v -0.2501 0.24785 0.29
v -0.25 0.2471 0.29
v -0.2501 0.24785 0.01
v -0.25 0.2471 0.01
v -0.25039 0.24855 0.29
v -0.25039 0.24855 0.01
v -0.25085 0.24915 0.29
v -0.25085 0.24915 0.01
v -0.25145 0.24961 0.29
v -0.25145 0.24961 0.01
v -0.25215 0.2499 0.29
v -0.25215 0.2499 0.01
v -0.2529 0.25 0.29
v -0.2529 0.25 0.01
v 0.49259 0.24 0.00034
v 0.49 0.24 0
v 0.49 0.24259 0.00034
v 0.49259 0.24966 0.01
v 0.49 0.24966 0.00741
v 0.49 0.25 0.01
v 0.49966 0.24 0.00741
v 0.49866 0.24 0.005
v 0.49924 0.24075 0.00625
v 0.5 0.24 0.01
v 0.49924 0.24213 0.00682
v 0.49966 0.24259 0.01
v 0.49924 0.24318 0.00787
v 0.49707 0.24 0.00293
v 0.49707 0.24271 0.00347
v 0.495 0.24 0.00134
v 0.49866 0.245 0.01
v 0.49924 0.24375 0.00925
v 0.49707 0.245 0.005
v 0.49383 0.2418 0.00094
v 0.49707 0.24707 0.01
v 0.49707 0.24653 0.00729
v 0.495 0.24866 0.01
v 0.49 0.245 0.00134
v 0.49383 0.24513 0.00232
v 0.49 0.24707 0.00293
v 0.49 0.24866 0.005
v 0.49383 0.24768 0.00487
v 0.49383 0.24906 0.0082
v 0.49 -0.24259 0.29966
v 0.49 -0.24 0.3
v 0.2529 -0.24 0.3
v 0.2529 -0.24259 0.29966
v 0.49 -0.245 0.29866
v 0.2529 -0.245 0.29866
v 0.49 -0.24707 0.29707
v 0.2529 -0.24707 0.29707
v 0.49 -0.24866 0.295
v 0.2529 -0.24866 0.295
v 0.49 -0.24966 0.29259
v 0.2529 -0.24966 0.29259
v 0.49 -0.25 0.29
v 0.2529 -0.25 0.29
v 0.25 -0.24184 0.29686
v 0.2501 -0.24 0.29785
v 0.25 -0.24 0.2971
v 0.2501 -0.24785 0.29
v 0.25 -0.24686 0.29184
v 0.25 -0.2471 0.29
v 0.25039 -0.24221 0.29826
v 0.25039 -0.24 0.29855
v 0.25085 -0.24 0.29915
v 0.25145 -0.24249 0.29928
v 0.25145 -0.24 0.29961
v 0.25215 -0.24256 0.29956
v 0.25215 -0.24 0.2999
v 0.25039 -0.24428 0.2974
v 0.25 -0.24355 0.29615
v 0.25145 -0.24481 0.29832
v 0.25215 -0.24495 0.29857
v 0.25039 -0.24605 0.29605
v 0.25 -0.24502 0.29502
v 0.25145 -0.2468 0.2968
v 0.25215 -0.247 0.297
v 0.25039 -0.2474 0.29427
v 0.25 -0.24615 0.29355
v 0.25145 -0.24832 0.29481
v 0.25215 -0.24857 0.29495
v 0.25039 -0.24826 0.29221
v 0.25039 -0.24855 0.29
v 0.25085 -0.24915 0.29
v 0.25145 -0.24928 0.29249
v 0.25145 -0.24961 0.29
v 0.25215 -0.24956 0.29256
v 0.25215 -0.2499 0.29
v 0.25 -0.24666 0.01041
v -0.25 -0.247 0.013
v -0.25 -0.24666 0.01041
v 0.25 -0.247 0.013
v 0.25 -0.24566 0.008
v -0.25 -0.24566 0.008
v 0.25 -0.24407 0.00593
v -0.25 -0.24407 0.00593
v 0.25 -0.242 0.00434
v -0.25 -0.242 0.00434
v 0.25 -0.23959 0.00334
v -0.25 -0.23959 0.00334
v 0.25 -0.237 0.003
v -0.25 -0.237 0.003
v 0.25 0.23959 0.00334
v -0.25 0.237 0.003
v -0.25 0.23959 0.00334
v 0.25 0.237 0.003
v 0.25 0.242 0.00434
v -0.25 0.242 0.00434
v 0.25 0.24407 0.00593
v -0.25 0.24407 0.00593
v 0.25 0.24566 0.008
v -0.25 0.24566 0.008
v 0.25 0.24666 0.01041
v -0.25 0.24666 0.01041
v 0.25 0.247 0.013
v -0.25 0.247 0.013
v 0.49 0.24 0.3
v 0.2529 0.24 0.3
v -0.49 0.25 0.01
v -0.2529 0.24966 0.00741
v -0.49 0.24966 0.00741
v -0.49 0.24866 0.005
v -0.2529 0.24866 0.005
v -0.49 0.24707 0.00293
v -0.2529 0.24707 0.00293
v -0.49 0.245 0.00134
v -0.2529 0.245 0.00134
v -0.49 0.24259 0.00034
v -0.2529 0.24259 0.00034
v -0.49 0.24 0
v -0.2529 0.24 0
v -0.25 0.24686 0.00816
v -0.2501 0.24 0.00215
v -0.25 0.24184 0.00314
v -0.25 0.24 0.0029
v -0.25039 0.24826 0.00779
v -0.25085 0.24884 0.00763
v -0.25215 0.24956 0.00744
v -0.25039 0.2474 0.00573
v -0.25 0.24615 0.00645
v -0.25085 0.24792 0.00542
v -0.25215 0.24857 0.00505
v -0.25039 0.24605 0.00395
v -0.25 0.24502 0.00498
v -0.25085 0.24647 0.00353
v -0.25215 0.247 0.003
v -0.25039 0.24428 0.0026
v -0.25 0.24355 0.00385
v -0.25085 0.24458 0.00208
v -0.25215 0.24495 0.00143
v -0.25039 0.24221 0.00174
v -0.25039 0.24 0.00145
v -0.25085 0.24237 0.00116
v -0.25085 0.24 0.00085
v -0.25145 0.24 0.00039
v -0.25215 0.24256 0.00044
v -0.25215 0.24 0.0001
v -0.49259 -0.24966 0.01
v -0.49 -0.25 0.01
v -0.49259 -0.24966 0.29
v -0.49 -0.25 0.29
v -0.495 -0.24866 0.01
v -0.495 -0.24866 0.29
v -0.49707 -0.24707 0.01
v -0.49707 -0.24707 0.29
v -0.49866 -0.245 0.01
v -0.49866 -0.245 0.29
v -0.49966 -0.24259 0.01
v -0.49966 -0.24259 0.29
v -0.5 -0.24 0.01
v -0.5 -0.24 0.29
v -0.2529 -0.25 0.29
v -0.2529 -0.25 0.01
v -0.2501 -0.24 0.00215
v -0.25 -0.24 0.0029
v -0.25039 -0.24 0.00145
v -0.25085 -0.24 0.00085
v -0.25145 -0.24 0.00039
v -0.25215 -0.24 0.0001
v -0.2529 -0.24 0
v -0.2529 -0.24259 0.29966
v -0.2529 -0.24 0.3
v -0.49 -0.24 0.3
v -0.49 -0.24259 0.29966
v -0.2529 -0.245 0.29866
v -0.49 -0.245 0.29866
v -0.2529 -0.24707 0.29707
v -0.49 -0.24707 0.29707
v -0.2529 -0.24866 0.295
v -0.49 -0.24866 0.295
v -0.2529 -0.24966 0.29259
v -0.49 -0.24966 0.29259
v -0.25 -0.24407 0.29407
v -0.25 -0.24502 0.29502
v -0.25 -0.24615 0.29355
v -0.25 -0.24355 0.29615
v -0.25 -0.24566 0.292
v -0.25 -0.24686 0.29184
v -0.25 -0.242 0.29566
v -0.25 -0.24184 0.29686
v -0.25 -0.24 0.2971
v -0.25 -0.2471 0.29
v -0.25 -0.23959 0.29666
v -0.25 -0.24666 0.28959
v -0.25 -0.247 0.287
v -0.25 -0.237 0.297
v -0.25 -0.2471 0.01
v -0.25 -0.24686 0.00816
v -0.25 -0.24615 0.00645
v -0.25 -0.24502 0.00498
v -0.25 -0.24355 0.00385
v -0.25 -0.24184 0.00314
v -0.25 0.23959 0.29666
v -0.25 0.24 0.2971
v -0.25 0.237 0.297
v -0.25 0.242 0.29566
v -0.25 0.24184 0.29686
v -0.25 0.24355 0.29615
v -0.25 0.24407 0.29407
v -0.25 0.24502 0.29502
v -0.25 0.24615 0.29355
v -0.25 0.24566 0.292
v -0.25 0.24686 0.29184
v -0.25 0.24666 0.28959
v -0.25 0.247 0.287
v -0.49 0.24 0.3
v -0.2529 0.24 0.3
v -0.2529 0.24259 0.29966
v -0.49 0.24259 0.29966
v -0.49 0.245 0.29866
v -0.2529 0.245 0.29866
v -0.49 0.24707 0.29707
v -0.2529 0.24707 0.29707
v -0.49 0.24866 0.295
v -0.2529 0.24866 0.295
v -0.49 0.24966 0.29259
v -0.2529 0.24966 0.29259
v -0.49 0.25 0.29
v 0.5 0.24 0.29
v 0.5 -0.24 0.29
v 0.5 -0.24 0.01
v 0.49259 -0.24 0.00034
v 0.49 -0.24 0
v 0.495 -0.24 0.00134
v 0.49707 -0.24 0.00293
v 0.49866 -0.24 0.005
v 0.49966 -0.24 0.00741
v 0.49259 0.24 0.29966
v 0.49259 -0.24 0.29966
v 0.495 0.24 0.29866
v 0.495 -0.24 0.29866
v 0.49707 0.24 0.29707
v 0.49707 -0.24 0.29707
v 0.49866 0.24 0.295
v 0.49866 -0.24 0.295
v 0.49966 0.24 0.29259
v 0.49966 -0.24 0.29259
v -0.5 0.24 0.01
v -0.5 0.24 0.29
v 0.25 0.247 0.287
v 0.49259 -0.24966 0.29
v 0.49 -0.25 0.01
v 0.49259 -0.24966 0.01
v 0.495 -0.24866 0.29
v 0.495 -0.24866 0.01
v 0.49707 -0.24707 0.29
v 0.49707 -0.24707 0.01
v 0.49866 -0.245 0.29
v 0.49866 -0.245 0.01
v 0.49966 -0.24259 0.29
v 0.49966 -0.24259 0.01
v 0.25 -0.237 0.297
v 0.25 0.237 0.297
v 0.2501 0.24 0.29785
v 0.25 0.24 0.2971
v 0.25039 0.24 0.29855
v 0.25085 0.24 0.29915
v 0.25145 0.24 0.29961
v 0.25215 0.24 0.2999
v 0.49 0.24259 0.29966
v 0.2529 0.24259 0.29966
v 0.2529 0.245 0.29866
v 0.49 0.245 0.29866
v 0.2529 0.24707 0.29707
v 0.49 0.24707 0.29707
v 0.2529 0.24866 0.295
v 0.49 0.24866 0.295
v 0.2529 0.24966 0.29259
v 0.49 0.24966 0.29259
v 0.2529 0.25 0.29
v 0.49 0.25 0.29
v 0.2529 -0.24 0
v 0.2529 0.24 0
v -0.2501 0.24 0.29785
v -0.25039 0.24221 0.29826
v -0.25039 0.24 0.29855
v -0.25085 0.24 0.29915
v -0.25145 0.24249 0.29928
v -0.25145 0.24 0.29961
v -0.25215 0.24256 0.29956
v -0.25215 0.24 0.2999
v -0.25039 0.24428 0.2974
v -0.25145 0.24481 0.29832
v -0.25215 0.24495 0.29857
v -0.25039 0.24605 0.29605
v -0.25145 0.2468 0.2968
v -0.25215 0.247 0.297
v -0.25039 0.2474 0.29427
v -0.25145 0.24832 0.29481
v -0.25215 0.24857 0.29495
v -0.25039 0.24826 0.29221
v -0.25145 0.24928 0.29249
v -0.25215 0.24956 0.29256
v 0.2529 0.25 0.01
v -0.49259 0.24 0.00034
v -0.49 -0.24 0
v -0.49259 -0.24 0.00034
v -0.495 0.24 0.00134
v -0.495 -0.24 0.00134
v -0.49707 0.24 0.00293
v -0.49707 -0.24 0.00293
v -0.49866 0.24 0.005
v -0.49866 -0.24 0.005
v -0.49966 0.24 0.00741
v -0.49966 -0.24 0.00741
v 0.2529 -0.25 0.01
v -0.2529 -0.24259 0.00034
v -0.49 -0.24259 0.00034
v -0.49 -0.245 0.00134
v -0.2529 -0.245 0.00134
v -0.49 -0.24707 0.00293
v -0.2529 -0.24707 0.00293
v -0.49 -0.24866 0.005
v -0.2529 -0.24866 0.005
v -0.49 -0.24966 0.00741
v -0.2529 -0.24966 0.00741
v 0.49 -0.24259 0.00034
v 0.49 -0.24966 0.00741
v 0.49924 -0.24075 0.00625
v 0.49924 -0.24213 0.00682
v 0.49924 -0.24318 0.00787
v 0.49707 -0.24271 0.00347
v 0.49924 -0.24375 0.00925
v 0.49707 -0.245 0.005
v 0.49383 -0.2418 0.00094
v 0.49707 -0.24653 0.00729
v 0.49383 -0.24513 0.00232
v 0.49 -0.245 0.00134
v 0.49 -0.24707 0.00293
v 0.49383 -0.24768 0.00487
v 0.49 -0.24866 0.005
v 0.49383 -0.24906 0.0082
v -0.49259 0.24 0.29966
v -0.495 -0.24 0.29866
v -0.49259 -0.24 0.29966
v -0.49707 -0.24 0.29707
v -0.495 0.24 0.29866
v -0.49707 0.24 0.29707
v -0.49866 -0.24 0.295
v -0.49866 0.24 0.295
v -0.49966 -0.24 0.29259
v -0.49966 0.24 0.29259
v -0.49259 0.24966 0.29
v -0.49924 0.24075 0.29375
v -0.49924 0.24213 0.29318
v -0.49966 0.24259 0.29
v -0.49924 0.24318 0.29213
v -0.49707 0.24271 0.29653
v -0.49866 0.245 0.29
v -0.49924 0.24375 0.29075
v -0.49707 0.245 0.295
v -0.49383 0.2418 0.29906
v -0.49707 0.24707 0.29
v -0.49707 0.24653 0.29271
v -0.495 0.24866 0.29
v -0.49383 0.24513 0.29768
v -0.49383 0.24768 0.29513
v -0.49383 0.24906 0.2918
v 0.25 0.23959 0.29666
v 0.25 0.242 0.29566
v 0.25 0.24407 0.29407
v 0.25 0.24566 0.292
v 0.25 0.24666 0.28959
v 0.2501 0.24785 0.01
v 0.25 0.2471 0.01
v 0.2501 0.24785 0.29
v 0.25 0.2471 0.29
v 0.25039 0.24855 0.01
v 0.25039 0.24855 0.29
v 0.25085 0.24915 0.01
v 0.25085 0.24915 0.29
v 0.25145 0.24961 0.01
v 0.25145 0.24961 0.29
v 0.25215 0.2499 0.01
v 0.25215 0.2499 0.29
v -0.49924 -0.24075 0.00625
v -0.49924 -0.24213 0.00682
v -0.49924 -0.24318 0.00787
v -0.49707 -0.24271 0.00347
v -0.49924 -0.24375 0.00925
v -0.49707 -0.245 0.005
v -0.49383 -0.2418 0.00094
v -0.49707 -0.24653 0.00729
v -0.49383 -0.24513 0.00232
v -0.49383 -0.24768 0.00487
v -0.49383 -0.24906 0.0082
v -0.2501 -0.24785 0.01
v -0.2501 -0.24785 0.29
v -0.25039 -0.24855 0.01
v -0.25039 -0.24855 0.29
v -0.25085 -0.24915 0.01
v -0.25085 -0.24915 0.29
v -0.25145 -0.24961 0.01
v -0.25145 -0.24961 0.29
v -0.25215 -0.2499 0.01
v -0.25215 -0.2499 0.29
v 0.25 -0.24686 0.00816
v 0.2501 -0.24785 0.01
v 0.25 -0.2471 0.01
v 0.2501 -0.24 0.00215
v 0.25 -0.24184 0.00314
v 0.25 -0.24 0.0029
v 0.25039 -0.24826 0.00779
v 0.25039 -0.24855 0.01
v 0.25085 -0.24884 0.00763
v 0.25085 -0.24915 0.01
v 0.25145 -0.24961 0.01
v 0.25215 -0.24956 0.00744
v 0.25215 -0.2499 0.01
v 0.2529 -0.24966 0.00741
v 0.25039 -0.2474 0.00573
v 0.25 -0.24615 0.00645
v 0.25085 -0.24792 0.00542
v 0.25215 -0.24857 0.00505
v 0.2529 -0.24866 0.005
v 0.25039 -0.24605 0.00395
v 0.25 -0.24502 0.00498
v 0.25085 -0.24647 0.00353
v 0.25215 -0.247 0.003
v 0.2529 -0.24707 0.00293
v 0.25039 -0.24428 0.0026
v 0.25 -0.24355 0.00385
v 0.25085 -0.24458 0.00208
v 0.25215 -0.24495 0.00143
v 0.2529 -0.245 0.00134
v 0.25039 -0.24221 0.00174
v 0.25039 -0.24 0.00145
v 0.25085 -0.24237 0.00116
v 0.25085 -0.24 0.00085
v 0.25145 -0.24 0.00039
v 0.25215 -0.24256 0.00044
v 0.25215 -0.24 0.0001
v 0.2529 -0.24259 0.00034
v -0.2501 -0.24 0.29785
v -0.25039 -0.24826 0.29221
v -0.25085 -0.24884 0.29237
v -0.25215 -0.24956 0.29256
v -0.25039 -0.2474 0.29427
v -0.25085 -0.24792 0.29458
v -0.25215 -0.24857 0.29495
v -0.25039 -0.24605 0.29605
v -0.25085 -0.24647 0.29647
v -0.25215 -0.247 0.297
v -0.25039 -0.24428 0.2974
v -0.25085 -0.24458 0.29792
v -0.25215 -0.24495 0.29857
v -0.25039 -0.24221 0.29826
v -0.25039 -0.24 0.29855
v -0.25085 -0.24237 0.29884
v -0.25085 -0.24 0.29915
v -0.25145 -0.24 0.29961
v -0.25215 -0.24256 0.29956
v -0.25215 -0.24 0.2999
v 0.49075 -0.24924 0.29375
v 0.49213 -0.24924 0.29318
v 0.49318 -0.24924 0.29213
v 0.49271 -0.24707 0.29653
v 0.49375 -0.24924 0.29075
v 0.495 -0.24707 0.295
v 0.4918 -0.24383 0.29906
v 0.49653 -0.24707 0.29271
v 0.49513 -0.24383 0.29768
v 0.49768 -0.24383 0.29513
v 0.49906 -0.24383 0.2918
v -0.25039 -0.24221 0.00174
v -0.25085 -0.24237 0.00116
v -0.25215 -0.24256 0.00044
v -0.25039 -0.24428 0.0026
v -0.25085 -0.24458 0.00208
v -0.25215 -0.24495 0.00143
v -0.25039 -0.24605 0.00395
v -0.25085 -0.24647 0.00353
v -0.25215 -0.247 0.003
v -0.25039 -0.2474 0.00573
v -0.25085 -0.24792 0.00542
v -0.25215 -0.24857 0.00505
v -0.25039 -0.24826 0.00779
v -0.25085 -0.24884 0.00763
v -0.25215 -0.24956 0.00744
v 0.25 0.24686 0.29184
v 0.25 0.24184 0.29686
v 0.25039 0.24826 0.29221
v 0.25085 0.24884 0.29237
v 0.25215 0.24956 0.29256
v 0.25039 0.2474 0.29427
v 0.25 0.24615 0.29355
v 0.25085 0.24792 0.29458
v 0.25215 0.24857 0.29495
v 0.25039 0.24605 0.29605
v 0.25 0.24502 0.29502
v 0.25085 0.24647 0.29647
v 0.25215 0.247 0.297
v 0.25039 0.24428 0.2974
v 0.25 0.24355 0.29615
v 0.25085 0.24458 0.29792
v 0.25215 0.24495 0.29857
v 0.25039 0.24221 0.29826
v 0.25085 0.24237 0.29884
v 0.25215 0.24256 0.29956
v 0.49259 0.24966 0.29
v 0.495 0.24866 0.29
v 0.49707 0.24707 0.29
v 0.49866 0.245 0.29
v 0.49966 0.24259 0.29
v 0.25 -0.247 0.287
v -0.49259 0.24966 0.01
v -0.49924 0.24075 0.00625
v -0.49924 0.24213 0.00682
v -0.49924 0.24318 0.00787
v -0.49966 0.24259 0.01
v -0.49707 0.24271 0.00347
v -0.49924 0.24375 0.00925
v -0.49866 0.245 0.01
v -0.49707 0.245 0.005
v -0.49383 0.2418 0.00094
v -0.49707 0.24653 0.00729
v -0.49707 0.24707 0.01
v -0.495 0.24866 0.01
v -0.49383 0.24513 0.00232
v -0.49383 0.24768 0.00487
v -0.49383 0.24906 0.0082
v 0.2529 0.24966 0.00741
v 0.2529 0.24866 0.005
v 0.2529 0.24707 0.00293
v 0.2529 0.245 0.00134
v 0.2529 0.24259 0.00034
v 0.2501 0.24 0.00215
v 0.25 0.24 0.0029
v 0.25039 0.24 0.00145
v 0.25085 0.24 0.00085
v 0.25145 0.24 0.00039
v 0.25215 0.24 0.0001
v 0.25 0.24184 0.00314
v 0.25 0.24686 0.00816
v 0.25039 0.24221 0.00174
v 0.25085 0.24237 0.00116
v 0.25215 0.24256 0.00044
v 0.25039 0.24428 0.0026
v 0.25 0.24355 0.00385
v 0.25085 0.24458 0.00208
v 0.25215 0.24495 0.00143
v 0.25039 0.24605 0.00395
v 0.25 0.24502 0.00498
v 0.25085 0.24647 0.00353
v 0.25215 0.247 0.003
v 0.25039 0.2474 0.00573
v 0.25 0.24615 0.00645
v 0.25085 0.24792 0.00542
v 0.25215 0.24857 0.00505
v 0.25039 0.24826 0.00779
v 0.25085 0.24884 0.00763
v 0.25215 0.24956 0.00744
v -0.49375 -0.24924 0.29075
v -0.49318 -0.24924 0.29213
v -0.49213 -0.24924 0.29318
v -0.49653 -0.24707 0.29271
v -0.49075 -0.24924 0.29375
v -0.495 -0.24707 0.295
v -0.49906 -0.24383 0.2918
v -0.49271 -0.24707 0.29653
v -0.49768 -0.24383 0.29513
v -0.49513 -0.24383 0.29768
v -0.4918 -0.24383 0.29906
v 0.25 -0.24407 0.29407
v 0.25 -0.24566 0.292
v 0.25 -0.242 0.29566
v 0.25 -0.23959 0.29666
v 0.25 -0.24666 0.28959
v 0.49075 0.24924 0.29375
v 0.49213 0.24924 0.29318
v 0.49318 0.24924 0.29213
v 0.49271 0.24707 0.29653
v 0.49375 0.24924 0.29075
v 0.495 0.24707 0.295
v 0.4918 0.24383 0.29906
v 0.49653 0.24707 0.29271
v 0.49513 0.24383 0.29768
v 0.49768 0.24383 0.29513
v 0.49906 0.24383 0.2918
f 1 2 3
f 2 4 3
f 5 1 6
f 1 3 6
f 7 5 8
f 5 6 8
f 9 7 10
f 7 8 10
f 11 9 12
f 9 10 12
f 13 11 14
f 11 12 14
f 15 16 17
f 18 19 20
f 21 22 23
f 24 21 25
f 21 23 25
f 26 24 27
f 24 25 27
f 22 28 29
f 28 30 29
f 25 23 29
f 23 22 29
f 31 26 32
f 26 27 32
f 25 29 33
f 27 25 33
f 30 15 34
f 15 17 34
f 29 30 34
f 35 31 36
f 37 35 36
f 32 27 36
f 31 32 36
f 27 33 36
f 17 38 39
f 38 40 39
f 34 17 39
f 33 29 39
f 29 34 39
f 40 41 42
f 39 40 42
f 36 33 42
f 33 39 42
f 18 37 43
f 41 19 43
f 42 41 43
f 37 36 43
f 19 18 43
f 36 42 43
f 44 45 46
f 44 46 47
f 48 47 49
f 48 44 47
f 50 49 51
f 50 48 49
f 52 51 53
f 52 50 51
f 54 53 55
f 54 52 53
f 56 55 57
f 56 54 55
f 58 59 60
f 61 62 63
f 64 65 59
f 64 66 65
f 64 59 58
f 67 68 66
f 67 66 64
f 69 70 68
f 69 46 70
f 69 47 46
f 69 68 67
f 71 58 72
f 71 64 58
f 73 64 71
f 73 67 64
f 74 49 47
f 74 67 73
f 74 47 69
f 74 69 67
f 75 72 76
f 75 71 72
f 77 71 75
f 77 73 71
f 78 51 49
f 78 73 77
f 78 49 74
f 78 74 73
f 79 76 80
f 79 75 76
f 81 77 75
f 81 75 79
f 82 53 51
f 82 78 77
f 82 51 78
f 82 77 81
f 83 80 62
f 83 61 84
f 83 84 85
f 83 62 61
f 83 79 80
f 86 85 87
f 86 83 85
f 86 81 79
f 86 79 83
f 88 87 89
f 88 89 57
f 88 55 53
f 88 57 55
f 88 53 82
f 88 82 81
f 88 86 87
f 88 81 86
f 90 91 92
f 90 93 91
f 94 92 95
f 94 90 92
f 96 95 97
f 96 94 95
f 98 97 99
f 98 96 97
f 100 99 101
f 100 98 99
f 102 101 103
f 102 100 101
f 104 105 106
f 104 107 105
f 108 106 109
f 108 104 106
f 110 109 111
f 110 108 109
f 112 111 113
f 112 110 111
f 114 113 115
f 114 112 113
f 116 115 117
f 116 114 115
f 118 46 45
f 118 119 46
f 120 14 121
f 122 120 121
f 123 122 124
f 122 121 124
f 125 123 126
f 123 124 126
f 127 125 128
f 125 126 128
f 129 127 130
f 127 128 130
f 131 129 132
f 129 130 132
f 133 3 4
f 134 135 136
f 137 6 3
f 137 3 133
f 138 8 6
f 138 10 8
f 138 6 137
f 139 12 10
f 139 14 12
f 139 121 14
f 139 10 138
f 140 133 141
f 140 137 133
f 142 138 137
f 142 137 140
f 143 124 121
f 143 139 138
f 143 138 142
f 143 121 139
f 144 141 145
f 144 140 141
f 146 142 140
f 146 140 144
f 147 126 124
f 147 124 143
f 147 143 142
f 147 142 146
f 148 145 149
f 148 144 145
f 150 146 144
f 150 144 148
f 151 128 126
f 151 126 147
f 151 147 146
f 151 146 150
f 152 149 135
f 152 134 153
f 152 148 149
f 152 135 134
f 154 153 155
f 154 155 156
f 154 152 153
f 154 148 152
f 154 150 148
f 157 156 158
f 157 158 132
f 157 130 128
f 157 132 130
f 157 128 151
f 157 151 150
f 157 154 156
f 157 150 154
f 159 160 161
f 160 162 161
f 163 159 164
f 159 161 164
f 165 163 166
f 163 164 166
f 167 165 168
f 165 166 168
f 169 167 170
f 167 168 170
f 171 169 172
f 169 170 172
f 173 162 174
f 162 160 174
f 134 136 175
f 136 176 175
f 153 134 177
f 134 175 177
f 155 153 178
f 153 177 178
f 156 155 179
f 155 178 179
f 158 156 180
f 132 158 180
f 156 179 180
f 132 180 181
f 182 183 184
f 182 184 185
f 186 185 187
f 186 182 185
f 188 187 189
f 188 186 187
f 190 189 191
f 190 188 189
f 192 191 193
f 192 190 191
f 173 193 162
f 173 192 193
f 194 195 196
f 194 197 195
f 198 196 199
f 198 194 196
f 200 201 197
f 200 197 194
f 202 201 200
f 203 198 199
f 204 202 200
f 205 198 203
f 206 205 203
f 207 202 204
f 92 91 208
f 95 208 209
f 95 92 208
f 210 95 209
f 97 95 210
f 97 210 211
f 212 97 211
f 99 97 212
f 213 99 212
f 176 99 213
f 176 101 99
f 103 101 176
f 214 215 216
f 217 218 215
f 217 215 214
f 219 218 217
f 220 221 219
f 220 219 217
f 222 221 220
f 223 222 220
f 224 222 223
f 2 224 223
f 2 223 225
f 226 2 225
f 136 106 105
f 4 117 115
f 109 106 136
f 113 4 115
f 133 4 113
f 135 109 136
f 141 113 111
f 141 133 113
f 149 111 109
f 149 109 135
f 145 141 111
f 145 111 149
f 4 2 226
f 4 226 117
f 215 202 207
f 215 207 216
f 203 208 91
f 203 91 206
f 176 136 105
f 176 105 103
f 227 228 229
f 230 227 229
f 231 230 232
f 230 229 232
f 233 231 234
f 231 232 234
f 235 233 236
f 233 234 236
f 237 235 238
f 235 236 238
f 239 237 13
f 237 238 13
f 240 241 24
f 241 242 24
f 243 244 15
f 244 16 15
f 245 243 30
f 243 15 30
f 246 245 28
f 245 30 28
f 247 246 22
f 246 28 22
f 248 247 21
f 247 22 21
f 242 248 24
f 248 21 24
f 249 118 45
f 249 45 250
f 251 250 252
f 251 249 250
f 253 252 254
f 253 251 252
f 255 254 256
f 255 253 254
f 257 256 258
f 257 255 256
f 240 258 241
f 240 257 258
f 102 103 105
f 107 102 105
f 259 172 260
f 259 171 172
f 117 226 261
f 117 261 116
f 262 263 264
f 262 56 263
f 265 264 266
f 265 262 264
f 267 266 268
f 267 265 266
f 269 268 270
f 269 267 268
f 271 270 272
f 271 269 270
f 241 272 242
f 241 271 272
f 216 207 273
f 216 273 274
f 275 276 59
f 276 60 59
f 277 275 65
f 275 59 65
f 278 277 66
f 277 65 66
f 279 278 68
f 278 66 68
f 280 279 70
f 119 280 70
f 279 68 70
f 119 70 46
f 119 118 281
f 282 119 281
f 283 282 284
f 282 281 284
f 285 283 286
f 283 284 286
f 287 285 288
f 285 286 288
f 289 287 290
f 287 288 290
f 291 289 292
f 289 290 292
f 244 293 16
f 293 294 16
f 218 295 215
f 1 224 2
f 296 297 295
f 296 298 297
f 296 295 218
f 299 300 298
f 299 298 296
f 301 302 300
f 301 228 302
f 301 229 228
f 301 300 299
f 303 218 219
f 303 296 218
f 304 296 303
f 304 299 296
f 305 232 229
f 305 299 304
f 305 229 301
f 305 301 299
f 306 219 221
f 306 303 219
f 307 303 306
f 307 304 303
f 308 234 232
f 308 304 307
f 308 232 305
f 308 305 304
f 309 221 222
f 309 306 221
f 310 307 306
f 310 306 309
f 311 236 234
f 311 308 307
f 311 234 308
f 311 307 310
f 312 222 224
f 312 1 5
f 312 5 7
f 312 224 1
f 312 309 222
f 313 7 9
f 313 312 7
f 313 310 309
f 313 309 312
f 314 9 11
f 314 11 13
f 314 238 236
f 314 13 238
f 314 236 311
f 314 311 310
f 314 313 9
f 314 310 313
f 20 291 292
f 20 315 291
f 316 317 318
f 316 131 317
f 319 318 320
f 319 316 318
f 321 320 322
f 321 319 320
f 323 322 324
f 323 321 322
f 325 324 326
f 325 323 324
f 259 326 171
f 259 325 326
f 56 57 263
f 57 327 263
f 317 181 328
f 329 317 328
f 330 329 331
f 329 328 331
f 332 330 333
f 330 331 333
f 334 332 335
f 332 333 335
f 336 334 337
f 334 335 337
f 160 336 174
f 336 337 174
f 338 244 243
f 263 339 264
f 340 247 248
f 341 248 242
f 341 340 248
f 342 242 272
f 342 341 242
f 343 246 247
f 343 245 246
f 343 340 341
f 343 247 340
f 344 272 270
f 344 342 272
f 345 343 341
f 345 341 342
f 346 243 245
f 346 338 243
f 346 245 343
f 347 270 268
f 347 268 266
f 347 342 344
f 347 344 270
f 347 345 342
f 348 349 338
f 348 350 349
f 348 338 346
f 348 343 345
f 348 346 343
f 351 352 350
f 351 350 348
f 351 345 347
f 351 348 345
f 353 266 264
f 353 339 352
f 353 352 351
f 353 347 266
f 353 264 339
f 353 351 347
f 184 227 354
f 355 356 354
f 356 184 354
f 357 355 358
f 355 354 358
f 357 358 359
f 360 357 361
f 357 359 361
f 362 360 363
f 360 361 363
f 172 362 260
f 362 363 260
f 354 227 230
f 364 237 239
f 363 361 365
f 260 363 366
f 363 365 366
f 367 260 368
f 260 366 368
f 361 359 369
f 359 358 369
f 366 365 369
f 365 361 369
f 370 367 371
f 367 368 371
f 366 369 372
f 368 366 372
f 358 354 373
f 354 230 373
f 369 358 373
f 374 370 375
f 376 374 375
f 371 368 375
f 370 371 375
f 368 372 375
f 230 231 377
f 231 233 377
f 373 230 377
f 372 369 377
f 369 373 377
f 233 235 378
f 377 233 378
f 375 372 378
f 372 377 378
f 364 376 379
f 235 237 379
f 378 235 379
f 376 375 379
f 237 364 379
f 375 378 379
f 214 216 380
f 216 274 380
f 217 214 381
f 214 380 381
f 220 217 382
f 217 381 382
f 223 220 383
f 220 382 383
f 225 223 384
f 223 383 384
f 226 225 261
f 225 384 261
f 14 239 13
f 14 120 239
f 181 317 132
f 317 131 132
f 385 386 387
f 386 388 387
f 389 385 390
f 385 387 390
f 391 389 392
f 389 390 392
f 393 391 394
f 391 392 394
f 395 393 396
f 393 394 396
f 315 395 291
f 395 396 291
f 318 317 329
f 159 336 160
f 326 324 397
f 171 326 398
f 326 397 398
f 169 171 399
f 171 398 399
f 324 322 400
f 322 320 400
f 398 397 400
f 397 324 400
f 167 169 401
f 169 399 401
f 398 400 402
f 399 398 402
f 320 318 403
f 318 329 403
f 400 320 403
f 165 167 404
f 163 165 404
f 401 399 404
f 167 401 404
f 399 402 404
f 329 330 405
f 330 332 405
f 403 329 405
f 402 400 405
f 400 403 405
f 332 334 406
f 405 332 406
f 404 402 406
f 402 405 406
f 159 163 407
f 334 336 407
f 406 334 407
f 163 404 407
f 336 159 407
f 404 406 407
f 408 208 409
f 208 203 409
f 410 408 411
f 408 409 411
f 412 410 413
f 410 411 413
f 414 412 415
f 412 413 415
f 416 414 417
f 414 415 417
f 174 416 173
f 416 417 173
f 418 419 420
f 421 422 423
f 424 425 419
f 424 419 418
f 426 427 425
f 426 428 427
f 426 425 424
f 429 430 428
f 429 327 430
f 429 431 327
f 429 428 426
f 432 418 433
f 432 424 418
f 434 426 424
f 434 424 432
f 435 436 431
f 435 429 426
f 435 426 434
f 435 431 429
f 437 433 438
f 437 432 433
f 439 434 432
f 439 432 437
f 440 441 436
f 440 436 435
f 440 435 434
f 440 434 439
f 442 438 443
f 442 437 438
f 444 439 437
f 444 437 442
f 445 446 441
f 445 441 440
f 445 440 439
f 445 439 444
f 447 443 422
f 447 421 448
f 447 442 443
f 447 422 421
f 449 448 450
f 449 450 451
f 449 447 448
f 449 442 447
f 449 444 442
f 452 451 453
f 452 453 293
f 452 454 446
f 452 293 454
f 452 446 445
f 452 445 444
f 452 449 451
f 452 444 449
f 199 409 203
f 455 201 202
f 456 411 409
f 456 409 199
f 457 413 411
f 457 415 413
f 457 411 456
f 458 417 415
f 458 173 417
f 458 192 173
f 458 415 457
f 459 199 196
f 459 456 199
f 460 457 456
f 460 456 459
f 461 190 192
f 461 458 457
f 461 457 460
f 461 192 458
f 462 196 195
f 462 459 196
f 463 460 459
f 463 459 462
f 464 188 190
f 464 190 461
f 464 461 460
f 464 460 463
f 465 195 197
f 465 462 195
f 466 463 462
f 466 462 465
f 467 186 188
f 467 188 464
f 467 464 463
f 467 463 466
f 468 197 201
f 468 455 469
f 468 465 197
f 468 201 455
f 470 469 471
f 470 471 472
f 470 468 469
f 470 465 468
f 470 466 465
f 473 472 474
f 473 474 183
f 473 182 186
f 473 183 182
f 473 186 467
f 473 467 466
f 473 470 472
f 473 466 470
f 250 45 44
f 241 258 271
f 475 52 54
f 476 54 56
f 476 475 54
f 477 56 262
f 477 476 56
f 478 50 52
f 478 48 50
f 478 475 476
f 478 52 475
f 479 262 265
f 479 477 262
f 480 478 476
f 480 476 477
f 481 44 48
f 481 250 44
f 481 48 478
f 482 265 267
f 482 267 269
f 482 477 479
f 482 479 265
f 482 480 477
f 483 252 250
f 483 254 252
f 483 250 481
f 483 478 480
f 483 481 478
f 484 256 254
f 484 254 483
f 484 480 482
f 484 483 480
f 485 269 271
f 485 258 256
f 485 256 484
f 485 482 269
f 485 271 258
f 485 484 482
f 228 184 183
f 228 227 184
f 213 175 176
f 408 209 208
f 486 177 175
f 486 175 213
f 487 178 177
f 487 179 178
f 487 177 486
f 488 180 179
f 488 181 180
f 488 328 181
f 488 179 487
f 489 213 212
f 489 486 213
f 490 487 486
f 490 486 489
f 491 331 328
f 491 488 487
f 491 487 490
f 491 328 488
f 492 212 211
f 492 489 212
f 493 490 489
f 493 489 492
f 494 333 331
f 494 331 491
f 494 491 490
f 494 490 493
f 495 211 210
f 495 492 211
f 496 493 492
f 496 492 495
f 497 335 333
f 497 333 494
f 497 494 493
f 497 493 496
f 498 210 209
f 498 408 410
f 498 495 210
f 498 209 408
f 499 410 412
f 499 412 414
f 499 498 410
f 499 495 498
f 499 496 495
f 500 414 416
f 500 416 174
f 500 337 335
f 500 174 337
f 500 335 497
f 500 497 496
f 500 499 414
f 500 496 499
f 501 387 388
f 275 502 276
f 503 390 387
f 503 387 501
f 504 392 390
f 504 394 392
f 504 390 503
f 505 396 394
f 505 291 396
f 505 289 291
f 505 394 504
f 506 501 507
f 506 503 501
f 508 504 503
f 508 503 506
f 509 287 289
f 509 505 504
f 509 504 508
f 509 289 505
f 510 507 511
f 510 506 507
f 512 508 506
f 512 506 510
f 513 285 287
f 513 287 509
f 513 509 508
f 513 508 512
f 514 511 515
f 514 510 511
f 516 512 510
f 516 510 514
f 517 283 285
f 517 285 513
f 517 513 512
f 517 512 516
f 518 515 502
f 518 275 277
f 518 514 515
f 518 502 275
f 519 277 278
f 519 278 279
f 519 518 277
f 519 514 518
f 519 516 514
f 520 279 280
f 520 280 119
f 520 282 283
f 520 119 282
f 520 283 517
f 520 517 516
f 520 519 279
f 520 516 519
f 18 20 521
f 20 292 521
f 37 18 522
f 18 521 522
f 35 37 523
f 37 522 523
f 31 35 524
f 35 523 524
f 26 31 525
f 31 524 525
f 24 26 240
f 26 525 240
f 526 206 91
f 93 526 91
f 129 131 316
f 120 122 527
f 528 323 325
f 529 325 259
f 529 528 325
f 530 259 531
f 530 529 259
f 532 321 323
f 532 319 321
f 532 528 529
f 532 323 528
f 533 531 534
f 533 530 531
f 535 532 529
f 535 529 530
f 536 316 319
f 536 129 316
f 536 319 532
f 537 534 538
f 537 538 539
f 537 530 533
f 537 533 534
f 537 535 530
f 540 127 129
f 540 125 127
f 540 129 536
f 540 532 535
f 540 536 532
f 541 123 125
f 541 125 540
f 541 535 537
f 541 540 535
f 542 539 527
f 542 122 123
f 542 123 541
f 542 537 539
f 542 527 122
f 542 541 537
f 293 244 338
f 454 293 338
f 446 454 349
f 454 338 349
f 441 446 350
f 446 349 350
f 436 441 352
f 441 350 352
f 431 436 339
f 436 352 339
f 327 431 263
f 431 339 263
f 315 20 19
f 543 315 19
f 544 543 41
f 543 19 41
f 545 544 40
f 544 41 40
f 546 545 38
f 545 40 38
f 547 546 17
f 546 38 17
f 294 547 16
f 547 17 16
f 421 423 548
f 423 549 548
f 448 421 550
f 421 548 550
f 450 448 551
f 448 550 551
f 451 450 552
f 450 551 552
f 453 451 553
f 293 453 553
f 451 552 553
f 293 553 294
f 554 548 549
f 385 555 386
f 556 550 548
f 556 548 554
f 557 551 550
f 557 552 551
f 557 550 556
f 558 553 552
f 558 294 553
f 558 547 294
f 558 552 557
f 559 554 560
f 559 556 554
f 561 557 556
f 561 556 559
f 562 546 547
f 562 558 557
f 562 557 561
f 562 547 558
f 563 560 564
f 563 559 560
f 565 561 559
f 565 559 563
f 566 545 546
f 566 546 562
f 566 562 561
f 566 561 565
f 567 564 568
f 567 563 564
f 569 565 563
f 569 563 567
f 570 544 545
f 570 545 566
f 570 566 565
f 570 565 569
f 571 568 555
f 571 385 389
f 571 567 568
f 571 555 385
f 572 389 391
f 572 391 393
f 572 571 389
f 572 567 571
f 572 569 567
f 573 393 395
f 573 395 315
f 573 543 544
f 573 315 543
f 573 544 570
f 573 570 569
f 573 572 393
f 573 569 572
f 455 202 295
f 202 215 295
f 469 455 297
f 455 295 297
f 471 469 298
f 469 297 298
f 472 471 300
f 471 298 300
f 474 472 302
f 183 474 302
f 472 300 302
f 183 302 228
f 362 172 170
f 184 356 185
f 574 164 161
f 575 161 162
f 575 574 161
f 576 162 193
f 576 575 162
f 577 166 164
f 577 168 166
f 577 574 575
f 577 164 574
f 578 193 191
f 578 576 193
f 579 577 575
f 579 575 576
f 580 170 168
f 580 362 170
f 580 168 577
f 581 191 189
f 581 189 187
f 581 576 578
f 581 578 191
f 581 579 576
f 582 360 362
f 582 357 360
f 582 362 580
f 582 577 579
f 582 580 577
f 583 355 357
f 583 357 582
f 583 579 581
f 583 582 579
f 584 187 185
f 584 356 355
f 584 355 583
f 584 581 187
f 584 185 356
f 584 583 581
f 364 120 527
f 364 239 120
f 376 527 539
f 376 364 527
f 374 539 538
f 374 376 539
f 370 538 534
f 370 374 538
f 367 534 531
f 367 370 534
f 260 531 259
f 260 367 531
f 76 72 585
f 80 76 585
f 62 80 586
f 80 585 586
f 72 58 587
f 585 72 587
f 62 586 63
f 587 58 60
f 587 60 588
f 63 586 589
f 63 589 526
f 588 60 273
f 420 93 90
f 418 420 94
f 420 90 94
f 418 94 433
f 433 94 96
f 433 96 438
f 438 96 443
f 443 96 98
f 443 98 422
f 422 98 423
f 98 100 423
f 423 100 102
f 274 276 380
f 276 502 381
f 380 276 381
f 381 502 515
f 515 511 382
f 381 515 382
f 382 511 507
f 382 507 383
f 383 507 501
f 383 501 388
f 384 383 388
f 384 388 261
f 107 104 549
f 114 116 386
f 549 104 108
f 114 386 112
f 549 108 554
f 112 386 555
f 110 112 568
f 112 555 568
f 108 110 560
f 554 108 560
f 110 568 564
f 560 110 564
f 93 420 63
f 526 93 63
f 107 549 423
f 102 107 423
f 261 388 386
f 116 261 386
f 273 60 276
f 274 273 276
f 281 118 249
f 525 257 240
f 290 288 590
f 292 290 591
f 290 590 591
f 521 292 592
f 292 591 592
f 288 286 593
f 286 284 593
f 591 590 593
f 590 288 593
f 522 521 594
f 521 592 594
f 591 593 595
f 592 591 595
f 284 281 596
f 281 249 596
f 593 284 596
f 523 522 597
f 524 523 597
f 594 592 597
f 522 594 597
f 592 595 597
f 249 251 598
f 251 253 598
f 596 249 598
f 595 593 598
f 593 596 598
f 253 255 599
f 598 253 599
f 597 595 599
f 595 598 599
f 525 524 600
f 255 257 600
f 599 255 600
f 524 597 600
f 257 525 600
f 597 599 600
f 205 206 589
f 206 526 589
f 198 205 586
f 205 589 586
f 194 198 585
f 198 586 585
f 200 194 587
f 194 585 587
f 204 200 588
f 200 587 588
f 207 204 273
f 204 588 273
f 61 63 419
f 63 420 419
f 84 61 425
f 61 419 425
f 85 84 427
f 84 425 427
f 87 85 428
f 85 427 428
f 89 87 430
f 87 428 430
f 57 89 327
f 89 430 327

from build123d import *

# Parameters (mm, degrees)
SKETCH1_W                           = 1
SKETCH1_H                           = 0.5
ALL_BODY_DEPTH                      = 0.3
CUT_OUT_THE_BODY_FOR_PIN_DEPTH      = 0.25
CUT_OUT_THE_BODY_FOR_PIN_DEPTH_BACK = 0.25
SKETCH2_OUTSIDE_W                   = 2.532
SKETCH2_OUTSIDE_H                   = 2.732
SKETCH2_OUTSIDE_W_2                 = 0.294
SKETCH2_OUTSIDE_H_2                 = 0.494
BODY_FILLET_R                       = 0.01
PIN_FILLET_A_R                      = 0.01
PIN_FILLET_B_R                      = 0.003


with BuildPart() as part:
    # Sketch1 → All body (new body)
    with BuildSketch(Plane.XY):
        Rectangle(SKETCH1_W, SKETCH1_H)
    extrude(amount=ALL_BODY_DEPTH)

    # Sketch2 outside → Cut out the body for pin (cut, two sides: drawn at the far end of the back side and taken through both)
    with BuildSketch(Plane(origin=(0, 0, 0), x_dir=(0, 0, -1), z_dir=(1, 0, 0)).offset(-CUT_OUT_THE_BODY_FOR_PIN_DEPTH_BACK)):
        with Locations((-0.15, 0)):
            Rectangle(SKETCH2_OUTSIDE_W, SKETCH2_OUTSIDE_H)
        with Locations((-0.15, 0)):
            Rectangle(SKETCH2_OUTSIDE_W_2, SKETCH2_OUTSIDE_H_2, mode=Mode.SUBTRACT)
    extrude(amount=CUT_OUT_THE_BODY_FOR_PIN_DEPTH + CUT_OUT_THE_BODY_FOR_PIN_DEPTH_BACK, mode=Mode.SUBTRACT)

    # Body fillet
    body_fillet_edges = [part.edges().sort_by_distance(p)[0] for p in [
        (0, 0.247, 0.003),
        (0, 0.247, 0.297),
        (0, -0.247, 0.297),
        (0, -0.247, 0.003),
    ]]
    fillet(body_fillet_edges, radius=BODY_FILLET_R)

    # Pin fillet a
    pin_fillet_a_edges = [part.edges().sort_by_distance(p)[0] for p in [
        (0.5, 0, 0.3),
        (-0.375, 0.25, 0),
        (0.375, -0.25, 0),
        (0.375, -0.25, 0.3),
        (-0.375, 0.25, 0.3),
        (0.375, 0.25, 0.3),
        (-0.5, 0, 0.3),
        (0.375, 0.25, 0),
        (0.5, 0, 0),
        (-0.375, -0.25, 0),
        (-0.5, 0, 0),
        (-0.5, 0.25, 0.15),
        (0.5, 0.25, 0.15),
        (0.5, -0.25, 0.15),
        (-0.5, -0.25, 0.15),
        (-0.375, -0.25, 0.3),
    ]]
    fillet(pin_fillet_a_edges, radius=PIN_FILLET_A_R)

    # Pin fillet b
    pin_fillet_b_edges = [part.edges().sort_by_distance(p)[0] for p in [
        (0.25, -0.25, 0.15),
        (0.25, 0, 0.3),
        (0.25, 0.25, 0.15),
        (0.25, 0, 0),
        (-0.25, 0.25, 0.15),
        (-0.25, 0, 0.3),
        (-0.25, -0.25, 0.15),
        (-0.25, 0, 0),
        (0.25, 0.247071068, 0.002928932),
        (0.25, -0.247071068, 0.002928932),
        (0.25, -0.247071068, 0.297071068),
        (0.25, 0.247071068, 0.297071068),
        (-0.25, -0.247071068, 0.297071068),
        (-0.25, 0.247071068, 0.297071068),
        (-0.25, -0.247071068, 0.002928932),
        (-0.25, 0.247071068, 0.002928932),
    ]]
    fillet(pin_fillet_b_edges, radius=PIN_FILLET_B_R - 0.0001)  # a hair under: the kernel refuses the full size


solid = part.part
